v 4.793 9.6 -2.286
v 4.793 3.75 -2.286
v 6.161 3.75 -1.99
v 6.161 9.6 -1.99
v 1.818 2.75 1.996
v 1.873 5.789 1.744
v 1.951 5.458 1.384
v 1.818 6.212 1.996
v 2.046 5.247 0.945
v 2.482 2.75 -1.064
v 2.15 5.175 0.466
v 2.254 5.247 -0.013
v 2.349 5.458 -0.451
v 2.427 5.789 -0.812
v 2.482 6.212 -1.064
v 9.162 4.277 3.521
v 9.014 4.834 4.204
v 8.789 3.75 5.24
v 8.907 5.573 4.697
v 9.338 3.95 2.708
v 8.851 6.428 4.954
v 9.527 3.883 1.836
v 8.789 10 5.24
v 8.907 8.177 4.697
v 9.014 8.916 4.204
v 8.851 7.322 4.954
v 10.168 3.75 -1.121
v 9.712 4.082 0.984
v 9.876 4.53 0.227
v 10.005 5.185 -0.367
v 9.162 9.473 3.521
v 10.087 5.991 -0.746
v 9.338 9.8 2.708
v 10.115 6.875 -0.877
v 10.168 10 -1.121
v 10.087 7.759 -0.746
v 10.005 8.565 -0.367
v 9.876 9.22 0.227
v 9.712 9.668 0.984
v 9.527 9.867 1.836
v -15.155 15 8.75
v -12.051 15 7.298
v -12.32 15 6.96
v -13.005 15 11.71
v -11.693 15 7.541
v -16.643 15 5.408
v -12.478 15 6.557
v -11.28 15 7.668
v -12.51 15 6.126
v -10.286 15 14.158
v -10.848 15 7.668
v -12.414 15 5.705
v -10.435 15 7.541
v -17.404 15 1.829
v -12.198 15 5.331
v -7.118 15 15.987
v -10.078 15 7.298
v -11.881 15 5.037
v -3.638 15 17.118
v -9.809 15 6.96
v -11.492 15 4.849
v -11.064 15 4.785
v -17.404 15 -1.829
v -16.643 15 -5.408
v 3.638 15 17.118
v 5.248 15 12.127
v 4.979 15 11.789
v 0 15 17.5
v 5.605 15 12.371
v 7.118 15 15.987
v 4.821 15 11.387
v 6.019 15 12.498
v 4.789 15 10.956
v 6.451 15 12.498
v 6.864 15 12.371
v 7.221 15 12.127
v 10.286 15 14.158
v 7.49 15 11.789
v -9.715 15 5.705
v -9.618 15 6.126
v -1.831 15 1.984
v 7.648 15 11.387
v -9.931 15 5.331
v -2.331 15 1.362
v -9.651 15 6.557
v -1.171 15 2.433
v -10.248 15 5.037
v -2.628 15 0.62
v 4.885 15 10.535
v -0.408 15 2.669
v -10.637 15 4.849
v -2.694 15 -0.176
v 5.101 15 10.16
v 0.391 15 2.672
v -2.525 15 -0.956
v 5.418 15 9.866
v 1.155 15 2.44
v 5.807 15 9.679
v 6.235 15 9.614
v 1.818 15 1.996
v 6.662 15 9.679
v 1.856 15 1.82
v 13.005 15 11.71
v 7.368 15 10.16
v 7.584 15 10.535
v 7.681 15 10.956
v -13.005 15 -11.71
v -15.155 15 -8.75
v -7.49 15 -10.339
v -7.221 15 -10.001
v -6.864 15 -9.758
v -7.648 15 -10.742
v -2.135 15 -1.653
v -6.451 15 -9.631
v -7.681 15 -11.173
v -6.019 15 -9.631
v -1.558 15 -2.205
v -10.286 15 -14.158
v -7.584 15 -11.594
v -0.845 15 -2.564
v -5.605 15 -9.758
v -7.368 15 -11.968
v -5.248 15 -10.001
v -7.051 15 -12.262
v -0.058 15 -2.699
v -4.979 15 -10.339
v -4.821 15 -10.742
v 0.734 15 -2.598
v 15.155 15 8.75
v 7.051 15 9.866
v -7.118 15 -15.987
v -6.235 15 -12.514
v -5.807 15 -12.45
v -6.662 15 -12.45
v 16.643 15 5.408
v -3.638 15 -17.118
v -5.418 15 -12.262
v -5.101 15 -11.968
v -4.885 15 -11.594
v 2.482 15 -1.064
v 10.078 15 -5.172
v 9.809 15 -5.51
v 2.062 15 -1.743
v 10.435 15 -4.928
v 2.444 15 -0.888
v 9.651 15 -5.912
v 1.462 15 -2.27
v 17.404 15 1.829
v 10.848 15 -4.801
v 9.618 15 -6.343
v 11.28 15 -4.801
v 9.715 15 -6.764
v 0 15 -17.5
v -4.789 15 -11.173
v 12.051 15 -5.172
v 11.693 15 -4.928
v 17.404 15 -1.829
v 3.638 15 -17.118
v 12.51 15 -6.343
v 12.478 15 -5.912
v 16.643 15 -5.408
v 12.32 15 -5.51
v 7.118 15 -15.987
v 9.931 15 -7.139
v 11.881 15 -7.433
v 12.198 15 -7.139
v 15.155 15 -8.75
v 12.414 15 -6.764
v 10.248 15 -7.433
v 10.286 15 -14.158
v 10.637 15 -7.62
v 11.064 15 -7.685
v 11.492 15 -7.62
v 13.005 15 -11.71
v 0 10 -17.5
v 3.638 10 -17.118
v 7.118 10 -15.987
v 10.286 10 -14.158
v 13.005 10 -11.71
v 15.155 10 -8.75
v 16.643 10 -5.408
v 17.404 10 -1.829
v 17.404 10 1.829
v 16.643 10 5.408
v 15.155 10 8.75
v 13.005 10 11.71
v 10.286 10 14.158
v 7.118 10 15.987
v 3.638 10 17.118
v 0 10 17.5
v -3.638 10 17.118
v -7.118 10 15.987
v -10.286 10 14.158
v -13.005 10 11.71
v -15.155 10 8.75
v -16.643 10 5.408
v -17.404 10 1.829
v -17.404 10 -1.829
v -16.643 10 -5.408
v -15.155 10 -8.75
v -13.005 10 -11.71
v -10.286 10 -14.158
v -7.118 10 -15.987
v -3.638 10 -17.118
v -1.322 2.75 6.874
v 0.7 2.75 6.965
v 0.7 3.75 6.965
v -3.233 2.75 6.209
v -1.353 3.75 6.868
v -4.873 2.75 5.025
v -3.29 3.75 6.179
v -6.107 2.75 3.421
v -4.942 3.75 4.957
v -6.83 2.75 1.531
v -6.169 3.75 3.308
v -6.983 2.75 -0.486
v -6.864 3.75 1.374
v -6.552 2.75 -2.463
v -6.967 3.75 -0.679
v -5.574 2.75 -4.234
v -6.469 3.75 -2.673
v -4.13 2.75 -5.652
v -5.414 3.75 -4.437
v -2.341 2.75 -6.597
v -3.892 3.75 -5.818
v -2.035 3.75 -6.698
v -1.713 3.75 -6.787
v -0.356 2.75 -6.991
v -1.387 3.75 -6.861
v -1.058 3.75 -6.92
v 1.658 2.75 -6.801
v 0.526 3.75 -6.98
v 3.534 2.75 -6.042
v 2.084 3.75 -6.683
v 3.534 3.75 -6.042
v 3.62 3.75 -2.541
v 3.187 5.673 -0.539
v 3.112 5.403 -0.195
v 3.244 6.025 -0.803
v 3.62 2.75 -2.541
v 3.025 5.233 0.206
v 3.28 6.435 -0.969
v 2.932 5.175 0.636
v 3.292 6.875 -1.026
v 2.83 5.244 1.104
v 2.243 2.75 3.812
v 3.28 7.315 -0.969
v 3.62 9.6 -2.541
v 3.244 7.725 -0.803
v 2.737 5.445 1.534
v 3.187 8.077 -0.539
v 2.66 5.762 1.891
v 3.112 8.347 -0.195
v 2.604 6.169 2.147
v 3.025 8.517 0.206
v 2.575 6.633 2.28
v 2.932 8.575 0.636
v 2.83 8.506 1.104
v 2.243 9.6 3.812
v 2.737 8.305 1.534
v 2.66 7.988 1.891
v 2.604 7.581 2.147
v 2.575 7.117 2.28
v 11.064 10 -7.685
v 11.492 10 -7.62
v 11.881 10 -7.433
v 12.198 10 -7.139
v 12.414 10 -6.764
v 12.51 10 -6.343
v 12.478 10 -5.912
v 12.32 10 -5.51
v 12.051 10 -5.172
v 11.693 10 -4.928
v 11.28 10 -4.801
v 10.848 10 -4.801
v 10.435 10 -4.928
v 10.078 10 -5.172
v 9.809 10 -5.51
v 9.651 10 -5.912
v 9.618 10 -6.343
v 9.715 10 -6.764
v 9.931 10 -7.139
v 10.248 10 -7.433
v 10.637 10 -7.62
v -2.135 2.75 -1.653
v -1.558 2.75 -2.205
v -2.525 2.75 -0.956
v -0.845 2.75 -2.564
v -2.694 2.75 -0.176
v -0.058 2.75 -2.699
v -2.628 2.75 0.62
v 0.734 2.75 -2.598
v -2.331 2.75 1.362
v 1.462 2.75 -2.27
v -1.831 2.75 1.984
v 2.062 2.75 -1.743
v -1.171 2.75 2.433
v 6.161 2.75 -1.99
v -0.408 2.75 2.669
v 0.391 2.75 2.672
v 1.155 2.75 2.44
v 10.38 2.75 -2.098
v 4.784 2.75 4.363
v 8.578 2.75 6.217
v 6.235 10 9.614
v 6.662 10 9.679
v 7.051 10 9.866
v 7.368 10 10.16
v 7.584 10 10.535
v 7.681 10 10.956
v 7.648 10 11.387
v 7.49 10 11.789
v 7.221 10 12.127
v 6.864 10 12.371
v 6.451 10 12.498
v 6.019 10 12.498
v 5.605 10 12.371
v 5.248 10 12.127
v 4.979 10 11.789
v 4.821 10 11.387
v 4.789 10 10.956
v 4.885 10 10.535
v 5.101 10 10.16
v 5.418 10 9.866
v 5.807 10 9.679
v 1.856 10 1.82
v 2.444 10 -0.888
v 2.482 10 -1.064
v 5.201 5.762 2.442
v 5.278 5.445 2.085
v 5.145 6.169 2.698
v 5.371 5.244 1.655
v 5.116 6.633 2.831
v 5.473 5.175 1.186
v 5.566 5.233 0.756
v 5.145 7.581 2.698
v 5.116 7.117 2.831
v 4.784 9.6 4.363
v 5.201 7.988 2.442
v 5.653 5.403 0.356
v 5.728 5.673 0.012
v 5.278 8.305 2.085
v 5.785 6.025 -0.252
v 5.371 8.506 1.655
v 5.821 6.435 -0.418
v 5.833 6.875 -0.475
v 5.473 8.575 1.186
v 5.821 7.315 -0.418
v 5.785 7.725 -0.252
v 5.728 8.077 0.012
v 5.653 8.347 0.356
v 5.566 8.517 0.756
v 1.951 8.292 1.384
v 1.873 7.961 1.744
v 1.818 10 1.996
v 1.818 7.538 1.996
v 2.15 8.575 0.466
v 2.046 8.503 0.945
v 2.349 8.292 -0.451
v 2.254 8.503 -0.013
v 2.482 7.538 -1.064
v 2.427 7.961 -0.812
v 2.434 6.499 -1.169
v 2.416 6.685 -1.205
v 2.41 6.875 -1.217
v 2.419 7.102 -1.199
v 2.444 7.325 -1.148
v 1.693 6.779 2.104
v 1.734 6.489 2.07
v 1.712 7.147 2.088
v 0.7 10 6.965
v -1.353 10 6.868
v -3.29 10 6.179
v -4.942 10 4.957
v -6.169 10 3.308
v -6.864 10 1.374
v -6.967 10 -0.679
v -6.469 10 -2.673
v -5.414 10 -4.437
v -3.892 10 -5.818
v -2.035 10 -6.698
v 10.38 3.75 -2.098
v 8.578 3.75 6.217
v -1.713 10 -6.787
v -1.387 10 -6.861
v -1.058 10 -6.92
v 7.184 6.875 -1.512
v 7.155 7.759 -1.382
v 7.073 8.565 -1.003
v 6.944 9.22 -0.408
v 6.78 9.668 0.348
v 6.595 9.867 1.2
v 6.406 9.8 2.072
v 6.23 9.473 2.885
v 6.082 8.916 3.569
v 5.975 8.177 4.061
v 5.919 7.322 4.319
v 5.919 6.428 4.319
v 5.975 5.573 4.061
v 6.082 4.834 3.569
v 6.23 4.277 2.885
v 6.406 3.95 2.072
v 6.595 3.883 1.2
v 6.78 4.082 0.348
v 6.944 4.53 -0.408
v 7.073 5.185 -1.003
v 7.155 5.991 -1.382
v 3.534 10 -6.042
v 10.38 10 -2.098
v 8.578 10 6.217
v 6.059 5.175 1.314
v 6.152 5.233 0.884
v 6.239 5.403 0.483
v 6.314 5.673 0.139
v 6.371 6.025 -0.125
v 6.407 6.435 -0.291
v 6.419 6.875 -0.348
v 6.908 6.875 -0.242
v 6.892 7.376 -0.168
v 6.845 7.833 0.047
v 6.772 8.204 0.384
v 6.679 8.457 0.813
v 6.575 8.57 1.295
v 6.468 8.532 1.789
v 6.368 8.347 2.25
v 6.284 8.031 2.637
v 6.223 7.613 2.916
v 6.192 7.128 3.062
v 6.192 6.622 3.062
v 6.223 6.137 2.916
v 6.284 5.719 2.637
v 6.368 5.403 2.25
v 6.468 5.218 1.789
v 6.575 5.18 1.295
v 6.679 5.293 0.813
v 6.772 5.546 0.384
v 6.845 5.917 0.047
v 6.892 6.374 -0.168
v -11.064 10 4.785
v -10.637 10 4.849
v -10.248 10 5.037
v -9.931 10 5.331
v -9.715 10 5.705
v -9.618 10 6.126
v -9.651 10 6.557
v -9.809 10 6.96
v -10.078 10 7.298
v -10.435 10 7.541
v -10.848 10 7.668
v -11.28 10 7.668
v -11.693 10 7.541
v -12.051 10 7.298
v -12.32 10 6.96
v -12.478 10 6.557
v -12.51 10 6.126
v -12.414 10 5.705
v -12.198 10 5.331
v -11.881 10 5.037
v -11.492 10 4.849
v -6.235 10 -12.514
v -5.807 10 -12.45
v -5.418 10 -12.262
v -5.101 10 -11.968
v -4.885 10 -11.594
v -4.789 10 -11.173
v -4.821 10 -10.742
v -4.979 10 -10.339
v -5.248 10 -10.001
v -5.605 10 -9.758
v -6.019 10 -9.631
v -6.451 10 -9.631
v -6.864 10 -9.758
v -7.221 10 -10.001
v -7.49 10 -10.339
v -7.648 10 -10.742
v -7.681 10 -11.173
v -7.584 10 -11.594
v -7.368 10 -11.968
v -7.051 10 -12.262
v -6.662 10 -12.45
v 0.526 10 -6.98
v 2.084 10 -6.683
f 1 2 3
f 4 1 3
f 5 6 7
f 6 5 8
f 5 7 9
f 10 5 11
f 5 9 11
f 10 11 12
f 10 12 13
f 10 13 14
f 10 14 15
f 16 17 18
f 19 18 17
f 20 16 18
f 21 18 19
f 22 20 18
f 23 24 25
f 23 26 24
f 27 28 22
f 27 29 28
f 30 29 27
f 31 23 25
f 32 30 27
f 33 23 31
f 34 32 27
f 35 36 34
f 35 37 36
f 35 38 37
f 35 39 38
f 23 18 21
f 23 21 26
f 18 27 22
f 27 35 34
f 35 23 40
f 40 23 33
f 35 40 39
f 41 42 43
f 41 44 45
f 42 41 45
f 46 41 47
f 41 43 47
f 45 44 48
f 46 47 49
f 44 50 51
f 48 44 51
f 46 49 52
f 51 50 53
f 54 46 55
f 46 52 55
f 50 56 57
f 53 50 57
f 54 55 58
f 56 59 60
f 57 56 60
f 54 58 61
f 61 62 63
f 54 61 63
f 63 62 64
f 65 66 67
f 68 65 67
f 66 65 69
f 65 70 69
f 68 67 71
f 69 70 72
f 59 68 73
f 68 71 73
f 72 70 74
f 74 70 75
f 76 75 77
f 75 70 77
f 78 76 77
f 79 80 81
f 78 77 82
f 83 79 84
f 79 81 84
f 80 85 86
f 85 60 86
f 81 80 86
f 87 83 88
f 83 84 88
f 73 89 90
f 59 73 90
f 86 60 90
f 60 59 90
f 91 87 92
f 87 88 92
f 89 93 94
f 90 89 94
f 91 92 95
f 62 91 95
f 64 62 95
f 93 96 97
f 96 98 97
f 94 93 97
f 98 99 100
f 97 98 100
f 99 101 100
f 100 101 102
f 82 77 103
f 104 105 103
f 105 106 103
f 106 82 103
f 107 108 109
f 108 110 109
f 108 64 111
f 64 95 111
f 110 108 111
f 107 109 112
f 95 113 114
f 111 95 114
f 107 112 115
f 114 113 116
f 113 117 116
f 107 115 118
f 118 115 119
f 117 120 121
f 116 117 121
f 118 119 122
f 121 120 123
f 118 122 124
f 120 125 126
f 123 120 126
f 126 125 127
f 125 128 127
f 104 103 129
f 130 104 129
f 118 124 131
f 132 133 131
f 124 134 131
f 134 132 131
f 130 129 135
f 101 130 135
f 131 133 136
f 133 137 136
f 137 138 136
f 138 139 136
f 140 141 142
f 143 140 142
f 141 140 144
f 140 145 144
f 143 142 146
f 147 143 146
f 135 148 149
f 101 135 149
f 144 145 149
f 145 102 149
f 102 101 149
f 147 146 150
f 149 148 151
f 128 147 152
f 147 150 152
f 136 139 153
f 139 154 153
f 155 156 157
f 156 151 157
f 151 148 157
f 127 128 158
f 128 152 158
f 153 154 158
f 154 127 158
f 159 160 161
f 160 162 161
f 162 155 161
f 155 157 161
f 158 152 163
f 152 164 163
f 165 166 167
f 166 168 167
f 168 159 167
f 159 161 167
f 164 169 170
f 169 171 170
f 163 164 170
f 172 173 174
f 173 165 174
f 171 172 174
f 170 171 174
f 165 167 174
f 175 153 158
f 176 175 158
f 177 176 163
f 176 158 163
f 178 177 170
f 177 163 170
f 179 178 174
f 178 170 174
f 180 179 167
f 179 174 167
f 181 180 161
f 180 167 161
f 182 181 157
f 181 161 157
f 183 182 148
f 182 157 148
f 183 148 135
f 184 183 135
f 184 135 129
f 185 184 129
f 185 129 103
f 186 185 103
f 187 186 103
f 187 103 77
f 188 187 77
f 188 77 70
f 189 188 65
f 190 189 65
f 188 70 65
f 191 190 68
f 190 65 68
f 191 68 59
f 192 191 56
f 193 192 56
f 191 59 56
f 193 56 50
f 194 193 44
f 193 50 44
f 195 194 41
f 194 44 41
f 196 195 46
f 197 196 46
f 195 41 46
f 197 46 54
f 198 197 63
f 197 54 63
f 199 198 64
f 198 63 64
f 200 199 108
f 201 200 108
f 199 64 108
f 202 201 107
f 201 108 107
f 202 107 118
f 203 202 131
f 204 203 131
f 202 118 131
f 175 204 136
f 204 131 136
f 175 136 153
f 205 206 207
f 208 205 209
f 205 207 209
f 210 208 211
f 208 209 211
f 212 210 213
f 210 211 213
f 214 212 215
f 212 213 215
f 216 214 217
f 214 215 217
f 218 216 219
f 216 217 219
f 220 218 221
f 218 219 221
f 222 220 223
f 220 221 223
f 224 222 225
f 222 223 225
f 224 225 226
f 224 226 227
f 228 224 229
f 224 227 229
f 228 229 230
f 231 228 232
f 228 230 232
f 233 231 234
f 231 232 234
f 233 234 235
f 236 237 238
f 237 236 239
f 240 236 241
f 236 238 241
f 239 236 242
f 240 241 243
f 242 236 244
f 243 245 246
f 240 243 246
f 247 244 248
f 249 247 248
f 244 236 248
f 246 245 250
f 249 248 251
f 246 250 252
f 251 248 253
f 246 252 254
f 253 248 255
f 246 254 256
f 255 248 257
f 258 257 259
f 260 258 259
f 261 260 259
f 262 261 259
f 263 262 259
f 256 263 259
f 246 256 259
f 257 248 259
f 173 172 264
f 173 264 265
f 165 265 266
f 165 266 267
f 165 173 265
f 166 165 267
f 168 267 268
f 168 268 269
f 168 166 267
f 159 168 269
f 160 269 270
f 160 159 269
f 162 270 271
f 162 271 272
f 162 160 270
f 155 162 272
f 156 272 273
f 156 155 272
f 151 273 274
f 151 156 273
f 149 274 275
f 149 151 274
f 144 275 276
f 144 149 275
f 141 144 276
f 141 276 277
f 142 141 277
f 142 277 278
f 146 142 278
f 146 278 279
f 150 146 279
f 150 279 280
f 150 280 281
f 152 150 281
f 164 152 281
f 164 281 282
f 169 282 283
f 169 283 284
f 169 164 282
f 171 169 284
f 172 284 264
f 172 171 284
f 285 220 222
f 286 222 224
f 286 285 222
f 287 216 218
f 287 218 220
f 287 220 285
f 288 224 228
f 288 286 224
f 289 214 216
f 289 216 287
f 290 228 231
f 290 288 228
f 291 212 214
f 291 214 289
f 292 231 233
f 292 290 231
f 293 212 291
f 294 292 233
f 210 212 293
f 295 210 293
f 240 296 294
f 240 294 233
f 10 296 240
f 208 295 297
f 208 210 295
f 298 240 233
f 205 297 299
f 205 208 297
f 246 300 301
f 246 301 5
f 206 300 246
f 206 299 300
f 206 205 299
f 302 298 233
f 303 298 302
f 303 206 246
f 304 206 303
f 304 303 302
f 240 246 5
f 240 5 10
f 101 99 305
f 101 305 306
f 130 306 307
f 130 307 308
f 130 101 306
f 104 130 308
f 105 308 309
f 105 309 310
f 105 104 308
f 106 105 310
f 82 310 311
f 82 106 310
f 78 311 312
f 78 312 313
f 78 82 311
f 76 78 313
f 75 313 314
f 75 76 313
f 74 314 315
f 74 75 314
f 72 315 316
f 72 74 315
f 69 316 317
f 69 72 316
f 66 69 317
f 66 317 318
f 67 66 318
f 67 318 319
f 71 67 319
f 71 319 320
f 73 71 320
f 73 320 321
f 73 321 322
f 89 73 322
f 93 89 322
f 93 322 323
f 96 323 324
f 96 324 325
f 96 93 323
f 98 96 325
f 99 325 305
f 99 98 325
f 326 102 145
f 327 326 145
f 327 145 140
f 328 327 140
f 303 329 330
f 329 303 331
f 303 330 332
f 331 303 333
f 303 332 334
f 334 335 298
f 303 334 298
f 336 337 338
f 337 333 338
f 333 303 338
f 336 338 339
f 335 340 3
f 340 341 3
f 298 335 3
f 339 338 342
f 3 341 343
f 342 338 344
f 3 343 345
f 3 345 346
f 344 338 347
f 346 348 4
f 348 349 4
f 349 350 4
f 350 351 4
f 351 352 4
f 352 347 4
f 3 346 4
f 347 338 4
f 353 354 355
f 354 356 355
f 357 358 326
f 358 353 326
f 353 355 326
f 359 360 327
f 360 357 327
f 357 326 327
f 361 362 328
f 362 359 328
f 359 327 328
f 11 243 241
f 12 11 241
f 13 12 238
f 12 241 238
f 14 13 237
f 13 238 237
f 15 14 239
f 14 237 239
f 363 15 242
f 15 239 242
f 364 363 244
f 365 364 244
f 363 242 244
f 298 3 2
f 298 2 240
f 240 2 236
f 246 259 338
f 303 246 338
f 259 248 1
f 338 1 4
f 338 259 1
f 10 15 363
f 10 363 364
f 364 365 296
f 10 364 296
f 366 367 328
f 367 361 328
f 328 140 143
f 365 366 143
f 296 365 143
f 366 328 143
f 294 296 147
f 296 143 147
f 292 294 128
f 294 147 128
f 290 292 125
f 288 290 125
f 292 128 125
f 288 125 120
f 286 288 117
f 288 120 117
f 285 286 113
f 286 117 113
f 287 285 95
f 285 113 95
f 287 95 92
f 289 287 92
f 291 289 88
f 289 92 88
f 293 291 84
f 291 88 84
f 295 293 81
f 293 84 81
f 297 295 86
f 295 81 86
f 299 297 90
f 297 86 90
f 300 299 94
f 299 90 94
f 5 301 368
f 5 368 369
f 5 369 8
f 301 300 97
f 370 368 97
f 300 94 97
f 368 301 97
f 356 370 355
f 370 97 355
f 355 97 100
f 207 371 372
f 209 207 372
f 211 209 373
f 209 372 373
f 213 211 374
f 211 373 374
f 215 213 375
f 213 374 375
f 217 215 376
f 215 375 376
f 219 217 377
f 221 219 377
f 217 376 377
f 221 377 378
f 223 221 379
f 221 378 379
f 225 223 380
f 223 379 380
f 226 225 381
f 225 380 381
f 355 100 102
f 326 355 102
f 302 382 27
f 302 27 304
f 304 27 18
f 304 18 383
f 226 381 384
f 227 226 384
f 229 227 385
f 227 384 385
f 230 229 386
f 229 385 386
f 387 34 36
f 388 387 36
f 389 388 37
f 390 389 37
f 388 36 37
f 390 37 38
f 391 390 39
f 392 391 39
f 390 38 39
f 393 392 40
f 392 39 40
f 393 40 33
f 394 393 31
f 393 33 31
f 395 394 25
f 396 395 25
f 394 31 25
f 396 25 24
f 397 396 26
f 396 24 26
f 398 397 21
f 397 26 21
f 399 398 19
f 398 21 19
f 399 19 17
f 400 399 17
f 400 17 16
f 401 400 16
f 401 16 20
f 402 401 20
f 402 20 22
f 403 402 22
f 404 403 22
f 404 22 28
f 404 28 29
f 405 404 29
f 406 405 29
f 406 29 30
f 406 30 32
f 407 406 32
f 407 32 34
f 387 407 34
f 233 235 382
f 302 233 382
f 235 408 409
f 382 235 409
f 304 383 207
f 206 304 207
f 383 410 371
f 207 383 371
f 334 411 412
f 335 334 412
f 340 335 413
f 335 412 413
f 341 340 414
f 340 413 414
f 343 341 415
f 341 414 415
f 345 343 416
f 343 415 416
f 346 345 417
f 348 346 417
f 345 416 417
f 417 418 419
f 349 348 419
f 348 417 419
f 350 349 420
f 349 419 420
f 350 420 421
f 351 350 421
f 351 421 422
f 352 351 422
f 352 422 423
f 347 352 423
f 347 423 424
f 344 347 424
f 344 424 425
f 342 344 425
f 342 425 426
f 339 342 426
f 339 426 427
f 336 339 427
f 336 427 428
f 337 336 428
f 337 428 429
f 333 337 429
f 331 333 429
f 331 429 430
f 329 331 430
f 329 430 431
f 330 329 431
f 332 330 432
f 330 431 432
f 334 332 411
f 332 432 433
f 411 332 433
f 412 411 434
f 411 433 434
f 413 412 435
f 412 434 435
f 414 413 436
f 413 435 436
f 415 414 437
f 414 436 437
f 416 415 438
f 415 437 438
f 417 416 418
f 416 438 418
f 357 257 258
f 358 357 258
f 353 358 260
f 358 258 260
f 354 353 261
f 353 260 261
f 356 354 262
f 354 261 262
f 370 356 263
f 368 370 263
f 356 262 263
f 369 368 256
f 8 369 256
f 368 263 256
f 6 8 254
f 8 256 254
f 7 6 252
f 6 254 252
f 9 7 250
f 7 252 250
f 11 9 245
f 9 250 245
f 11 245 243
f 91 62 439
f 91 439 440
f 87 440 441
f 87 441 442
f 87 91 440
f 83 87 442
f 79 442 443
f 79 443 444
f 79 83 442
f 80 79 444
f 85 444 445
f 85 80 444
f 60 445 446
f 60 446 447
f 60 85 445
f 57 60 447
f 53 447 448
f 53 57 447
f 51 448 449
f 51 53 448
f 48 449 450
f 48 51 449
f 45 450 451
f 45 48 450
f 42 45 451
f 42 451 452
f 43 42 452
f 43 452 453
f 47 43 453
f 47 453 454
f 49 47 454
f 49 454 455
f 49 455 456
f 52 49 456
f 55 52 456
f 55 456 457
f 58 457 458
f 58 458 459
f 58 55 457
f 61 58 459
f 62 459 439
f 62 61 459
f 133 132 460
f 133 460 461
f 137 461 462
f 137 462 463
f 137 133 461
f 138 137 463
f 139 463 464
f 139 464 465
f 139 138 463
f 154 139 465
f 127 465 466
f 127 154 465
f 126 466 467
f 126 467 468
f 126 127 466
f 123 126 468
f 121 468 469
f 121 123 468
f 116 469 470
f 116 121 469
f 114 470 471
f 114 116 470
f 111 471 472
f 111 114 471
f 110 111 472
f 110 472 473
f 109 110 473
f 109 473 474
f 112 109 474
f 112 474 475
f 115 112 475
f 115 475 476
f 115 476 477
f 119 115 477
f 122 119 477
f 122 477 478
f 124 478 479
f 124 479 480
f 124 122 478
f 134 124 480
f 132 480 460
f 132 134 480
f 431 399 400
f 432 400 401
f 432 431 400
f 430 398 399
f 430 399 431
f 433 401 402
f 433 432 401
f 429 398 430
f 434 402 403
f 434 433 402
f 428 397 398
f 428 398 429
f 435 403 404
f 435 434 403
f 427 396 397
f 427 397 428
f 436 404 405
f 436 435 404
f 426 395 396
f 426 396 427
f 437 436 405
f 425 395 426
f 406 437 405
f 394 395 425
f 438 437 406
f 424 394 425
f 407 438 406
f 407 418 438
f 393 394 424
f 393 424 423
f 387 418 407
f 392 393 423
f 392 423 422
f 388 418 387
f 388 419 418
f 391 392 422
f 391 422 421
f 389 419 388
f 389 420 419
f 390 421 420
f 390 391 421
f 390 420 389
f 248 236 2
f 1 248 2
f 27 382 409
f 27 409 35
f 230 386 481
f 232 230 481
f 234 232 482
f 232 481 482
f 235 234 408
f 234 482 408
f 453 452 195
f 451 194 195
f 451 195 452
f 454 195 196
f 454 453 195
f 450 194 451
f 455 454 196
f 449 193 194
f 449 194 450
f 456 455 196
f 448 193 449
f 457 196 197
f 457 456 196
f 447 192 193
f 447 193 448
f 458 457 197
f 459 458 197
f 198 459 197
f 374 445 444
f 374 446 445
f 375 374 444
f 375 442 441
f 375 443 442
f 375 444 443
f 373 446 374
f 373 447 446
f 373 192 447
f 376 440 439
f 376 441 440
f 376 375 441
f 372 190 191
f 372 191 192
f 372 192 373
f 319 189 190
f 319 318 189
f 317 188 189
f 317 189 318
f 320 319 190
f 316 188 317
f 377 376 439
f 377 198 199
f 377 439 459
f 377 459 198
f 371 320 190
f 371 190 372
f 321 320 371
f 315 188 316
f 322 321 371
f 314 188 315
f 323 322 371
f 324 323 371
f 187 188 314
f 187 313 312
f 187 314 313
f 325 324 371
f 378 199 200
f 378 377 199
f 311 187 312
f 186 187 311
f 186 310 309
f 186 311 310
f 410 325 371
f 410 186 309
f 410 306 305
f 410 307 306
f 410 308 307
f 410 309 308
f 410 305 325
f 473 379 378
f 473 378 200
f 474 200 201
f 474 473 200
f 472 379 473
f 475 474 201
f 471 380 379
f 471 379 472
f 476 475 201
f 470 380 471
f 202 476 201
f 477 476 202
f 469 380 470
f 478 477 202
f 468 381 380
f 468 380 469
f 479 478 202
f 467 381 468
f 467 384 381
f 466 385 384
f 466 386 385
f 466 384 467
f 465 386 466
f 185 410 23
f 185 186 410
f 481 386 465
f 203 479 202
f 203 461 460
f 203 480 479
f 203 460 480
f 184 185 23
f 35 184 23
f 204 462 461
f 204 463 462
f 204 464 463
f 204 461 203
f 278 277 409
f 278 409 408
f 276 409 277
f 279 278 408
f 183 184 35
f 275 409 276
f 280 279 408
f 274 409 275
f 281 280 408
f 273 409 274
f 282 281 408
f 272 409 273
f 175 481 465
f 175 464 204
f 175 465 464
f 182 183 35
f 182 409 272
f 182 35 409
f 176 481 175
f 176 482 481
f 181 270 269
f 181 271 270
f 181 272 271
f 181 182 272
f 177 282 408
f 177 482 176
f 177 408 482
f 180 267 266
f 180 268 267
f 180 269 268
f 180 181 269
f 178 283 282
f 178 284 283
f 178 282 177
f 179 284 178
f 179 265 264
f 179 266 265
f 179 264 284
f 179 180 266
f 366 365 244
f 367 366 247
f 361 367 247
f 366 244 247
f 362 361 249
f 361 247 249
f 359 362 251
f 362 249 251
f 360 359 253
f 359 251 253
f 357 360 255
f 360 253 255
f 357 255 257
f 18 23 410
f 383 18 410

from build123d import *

# Parameters (mm, degrees)
SKETCH1_R           = 17.5
SKETCH1_R_2         = 1.45
BOSS_EXTRUDE1_DEPTH = 5
BOSS_EXTRUDE2_DEPTH = 6.25
CUT_EXTRUDE1_DEPTH  = 7
CUT_EXTRUDE2_DEPTH  = 5.85
BOSS_EXTRUDE3_START = 2
SKETCH5_W           = 6.504597346
SKETCH5_H           = 6.25
SKETCH5_R           = 1.7
BOSS_EXTRUDE3_DEPTH = 2
SKETCH6_R           = 3
CUT_EXTRUDE3_DEPTH  = 1.5
BOSS_EXTRUDE4_START = 1.5
SKETCH7_W           = 6.508151024
SKETCH7_H           = 6.25
SKETCH7_R           = 3
BOSS_EXTRUDE4_DEPTH = 1.5
BOSS_EXTRUDE5_START = -6.25
BOSS_EXTRUDE5_DEPTH = 6.25
BOSS_EXTRUDE6_DEPTH = 1


with BuildPart() as part:
    # Sketch1 → Boss-Extrude1 (new body)
    with BuildSketch(Plane.XZ.offset(-15)):
        with Locations(Location((0, 0, 0), (0, 0, 270))):
            Circle(SKETCH1_R)
        with Locations(Location((-6.234624063, -11.064332912, 0), (0, 0, 270))):
            Circle(SKETCH1_R_2, mode=Mode.SUBTRACT)
        with Locations(Location((11.064332912, -6.234624063, 0), (0, 0, 270))):
            Circle(SKETCH1_R_2, mode=Mode.SUBTRACT)
        with Locations(Location((-11.064332912, 6.234624063, 0), (0, 0, 270))):
            Circle(SKETCH1_R_2, mode=Mode.SUBTRACT)
        with BuildLine():
            ThreePointArc((2.481687642, -1.063591298), (-2.638702415, -0.572057308), (1.818419998, 1.995832837))
            Line((1.818419998, 1.995832837), (1.856473873, 1.82030348))
            Line((1.856473873, 1.82030348), (2.443633767, -0.888061941))
            Line((2.443633767, -0.888061941), (2.481687642, -1.063591298))
        make_face(mode=Mode.SUBTRACT)
        with Locations(Location((6.234624063, 11.064332912, 0), (0, 0, 270))):
            Circle(SKETCH1_R_2, mode=Mode.SUBTRACT)
    extrude(amount=BOSS_EXTRUDE1_DEPTH)

    # Sketch2 → Boss-Extrude2 (add)
    with BuildSketch(Plane.XZ.offset(-10)):
        with BuildLine():
            Line((6.747748589, -1.862226887), (6.059242583, 1.313613078))
            Line((6.059242583, 1.313613078), (5.370736577, 4.489453042))
            ThreePointArc((5.370736577, 4.489453042), (-5.837040783, 3.863800576), (-2.034603986, -6.697789682))
            ThreePointArc((-2.034603986, -6.697789682), (-1.550245392, -6.826180427), (-1.05794298, -6.919592232))
            ThreePointArc((-1.05794298, -6.919592232), (1.483111539, -6.841080336), (3.828542975, -5.860226846))
            ThreePointArc((3.828542975, -5.860226846), (4.323739448, -5.505022905), (4.786164678, -5.108094329))
            ThreePointArc((4.786164678, -5.108094329), (5.990968426, -3.620538264), (6.747748589, -1.862226887))
        make_face()
        with BuildLine():
            ThreePointArc((2.481687642, -1.063591298), (-2.638702415, -0.572057308), (1.818419998, 1.995832837))
            Line((1.818419998, 1.995832837), (2.481687642, -1.063591298))
        make_face(mode=Mode.SUBTRACT)
    extrude(amount=BOSS_EXTRUDE2_DEPTH)

    # Sketch3 → Cut-Extrude1 (cut)
    with BuildSketch(Plane(origin=(6.059242583, 0, 1.313613078), x_dir=(0.21187307702941563, 0, -0.9772971908432395), z_dir=(0.9772971908432395, 0, 0.21187307702941563))):
        with BuildLine():
            ThreePointArc((0, 8.575), (-1.7, 6.875), (0, 5.175))
            Line((0, 5.175), (0, 8.575))
        make_face()
        with BuildLine():
            Line((0, 8.575), (0, 5.175))
            ThreePointArc((0, 5.175), (1.202081528, 5.672918472), (1.7, 6.875))
            ThreePointArc((1.7, 6.875), (1.202081528, 8.077081528), (0, 8.575))
        make_face()
    extrude(amount=-CUT_EXTRUDE1_DEPTH, mode=Mode.SUBTRACT)

    # Sketch4 → Cut-Extrude2 (cut)
    with BuildSketch(Plane.XZ.offset(-3.75)):
        Polygon((3.620479073, -2.540596639), (4.793235702, -2.286348947), (6.161451769, -1.989726639), (4.784276768, 4.362705102), (2.243304072, 3.811835101), align=None)
    extrude(amount=-CUT_EXTRUDE2_DEPTH, mode=Mode.SUBTRACT)

    # Sketch5 → Boss-Extrude3 (add)
    with BuildSketch(Plane(origin=(6.059242583, 0, 1.313613078), x_dir=(0.21187307702941563, 0, -0.9772971908432395), z_dir=(0.9772971908432395, 0, 0.21187307702941563)).offset(BOSS_EXTRUDE3_START)):
        with Locations((-0.002683311, 6.875)):
            Rectangle(SKETCH5_W, SKETCH5_H)
        with Locations((0, 6.875)):
            Circle(SKETCH5_R, mode=Mode.SUBTRACT)
    extrude(amount=-BOSS_EXTRUDE3_DEPTH)

    # Sketch6 → Cut-Extrude3 (cut)
    with BuildSketch(Plane(origin=(8.013836965, 0, 1.737359232), x_dir=(0.21187307702941569, 0, -0.9772971908432395), z_dir=(0.9772971908432395, 0, 0.21187307702941569))):
        with Locations((0, 6.875)):
            Circle(SKETCH6_R)
    extrude(amount=-CUT_EXTRUDE3_DEPTH, mode=Mode.SUBTRACT)

    # Sketch7 → Boss-Extrude4 (add)
    with BuildSketch(Plane(origin=(8.013836965, 0, 1.737359232), x_dir=(0.21187307702941569, 0, -0.9772971908432395), z_dir=(0.9772971908432395, 0, 0.21187307702941569)).offset(BOSS_EXTRUDE4_START)):
        with Locations((-0.00446015, 6.875)):
            Rectangle(SKETCH7_W, SKETCH7_H)
        with Locations((0, 6.875)):
            Circle(SKETCH7_R, mode=Mode.SUBTRACT)
    extrude(amount=-BOSS_EXTRUDE4_DEPTH)

    # Sketch8 → Boss-Extrude5 (add)
    with BuildSketch(Plane.XZ.offset(-3.75).offset(BOSS_EXTRUDE5_START)):
        with BuildLine():
            Line((8.789386774, 5.239726596), (8.577513697, 6.217023787))
            Line((8.577513697, 6.217023787), (0.69957596, 6.964954664))
            ThreePointArc((0.69957596, 6.964954664), (3.27783475, 6.185127271), (5.370736577, 4.489453042))
            Line((5.370736577, 4.489453042), (5.369599535, 4.494697826))
            Line((5.369599535, 4.494697826), (7.324193916, 4.91844398))
            Line((7.324193916, 4.91844398), (7.323440988, 4.921916981))
            Line((7.323440988, 4.921916981), (8.789386774, 5.239726596))
        make_face()
        with BuildLine():
            ThreePointArc((6.747748589, -1.862226887), (5.549511662, -4.266488053), (3.533996626, -6.042422349))
            Line((3.533996626, -6.042422349), (10.380161834, -2.097968308))
            Line((10.380161834, -2.097968308), (10.168288757, -1.120671117))
            Line((10.168288757, -1.120671117), (6.747748589, -1.862226887))
        make_face()
    extrude(amount=BOSS_EXTRUDE5_DEPTH)

    # Sketch10 → Boss-Extrude6 (add)
    with BuildSketch(Plane.XZ.offset(-3.75)):
        with BuildLine():
            Line((8.577513697, 6.217023787), (0.69957596, 6.964954664))
            ThreePointArc((0.69957596, 6.964954664), (-6.839499134, -1.490386391), (3.533996626, -6.042422349))
            Line((3.533996626, -6.042422349), (10.380161834, -2.097968308))
            Line((10.380161834, -2.097968308), (8.577513697, 6.217023787))
        make_face()
        Polygon((6.161451769, -1.989726639), (3.620479073, -2.540596639), (2.243304072, 3.811835101), (4.784276768, 4.362705102), align=None, mode=Mode.SUBTRACT)
        with BuildLine():
            Line((1.818419998, 1.995832837), (2.481687642, -1.063591298))
            ThreePointArc((2.481687642, -1.063591298), (-2.638702415, -0.572057308), (1.818419998, 1.995832837))
        make_face(mode=Mode.SUBTRACT)
    extrude(amount=BOSS_EXTRUDE6_DEPTH)


solid = part.part
